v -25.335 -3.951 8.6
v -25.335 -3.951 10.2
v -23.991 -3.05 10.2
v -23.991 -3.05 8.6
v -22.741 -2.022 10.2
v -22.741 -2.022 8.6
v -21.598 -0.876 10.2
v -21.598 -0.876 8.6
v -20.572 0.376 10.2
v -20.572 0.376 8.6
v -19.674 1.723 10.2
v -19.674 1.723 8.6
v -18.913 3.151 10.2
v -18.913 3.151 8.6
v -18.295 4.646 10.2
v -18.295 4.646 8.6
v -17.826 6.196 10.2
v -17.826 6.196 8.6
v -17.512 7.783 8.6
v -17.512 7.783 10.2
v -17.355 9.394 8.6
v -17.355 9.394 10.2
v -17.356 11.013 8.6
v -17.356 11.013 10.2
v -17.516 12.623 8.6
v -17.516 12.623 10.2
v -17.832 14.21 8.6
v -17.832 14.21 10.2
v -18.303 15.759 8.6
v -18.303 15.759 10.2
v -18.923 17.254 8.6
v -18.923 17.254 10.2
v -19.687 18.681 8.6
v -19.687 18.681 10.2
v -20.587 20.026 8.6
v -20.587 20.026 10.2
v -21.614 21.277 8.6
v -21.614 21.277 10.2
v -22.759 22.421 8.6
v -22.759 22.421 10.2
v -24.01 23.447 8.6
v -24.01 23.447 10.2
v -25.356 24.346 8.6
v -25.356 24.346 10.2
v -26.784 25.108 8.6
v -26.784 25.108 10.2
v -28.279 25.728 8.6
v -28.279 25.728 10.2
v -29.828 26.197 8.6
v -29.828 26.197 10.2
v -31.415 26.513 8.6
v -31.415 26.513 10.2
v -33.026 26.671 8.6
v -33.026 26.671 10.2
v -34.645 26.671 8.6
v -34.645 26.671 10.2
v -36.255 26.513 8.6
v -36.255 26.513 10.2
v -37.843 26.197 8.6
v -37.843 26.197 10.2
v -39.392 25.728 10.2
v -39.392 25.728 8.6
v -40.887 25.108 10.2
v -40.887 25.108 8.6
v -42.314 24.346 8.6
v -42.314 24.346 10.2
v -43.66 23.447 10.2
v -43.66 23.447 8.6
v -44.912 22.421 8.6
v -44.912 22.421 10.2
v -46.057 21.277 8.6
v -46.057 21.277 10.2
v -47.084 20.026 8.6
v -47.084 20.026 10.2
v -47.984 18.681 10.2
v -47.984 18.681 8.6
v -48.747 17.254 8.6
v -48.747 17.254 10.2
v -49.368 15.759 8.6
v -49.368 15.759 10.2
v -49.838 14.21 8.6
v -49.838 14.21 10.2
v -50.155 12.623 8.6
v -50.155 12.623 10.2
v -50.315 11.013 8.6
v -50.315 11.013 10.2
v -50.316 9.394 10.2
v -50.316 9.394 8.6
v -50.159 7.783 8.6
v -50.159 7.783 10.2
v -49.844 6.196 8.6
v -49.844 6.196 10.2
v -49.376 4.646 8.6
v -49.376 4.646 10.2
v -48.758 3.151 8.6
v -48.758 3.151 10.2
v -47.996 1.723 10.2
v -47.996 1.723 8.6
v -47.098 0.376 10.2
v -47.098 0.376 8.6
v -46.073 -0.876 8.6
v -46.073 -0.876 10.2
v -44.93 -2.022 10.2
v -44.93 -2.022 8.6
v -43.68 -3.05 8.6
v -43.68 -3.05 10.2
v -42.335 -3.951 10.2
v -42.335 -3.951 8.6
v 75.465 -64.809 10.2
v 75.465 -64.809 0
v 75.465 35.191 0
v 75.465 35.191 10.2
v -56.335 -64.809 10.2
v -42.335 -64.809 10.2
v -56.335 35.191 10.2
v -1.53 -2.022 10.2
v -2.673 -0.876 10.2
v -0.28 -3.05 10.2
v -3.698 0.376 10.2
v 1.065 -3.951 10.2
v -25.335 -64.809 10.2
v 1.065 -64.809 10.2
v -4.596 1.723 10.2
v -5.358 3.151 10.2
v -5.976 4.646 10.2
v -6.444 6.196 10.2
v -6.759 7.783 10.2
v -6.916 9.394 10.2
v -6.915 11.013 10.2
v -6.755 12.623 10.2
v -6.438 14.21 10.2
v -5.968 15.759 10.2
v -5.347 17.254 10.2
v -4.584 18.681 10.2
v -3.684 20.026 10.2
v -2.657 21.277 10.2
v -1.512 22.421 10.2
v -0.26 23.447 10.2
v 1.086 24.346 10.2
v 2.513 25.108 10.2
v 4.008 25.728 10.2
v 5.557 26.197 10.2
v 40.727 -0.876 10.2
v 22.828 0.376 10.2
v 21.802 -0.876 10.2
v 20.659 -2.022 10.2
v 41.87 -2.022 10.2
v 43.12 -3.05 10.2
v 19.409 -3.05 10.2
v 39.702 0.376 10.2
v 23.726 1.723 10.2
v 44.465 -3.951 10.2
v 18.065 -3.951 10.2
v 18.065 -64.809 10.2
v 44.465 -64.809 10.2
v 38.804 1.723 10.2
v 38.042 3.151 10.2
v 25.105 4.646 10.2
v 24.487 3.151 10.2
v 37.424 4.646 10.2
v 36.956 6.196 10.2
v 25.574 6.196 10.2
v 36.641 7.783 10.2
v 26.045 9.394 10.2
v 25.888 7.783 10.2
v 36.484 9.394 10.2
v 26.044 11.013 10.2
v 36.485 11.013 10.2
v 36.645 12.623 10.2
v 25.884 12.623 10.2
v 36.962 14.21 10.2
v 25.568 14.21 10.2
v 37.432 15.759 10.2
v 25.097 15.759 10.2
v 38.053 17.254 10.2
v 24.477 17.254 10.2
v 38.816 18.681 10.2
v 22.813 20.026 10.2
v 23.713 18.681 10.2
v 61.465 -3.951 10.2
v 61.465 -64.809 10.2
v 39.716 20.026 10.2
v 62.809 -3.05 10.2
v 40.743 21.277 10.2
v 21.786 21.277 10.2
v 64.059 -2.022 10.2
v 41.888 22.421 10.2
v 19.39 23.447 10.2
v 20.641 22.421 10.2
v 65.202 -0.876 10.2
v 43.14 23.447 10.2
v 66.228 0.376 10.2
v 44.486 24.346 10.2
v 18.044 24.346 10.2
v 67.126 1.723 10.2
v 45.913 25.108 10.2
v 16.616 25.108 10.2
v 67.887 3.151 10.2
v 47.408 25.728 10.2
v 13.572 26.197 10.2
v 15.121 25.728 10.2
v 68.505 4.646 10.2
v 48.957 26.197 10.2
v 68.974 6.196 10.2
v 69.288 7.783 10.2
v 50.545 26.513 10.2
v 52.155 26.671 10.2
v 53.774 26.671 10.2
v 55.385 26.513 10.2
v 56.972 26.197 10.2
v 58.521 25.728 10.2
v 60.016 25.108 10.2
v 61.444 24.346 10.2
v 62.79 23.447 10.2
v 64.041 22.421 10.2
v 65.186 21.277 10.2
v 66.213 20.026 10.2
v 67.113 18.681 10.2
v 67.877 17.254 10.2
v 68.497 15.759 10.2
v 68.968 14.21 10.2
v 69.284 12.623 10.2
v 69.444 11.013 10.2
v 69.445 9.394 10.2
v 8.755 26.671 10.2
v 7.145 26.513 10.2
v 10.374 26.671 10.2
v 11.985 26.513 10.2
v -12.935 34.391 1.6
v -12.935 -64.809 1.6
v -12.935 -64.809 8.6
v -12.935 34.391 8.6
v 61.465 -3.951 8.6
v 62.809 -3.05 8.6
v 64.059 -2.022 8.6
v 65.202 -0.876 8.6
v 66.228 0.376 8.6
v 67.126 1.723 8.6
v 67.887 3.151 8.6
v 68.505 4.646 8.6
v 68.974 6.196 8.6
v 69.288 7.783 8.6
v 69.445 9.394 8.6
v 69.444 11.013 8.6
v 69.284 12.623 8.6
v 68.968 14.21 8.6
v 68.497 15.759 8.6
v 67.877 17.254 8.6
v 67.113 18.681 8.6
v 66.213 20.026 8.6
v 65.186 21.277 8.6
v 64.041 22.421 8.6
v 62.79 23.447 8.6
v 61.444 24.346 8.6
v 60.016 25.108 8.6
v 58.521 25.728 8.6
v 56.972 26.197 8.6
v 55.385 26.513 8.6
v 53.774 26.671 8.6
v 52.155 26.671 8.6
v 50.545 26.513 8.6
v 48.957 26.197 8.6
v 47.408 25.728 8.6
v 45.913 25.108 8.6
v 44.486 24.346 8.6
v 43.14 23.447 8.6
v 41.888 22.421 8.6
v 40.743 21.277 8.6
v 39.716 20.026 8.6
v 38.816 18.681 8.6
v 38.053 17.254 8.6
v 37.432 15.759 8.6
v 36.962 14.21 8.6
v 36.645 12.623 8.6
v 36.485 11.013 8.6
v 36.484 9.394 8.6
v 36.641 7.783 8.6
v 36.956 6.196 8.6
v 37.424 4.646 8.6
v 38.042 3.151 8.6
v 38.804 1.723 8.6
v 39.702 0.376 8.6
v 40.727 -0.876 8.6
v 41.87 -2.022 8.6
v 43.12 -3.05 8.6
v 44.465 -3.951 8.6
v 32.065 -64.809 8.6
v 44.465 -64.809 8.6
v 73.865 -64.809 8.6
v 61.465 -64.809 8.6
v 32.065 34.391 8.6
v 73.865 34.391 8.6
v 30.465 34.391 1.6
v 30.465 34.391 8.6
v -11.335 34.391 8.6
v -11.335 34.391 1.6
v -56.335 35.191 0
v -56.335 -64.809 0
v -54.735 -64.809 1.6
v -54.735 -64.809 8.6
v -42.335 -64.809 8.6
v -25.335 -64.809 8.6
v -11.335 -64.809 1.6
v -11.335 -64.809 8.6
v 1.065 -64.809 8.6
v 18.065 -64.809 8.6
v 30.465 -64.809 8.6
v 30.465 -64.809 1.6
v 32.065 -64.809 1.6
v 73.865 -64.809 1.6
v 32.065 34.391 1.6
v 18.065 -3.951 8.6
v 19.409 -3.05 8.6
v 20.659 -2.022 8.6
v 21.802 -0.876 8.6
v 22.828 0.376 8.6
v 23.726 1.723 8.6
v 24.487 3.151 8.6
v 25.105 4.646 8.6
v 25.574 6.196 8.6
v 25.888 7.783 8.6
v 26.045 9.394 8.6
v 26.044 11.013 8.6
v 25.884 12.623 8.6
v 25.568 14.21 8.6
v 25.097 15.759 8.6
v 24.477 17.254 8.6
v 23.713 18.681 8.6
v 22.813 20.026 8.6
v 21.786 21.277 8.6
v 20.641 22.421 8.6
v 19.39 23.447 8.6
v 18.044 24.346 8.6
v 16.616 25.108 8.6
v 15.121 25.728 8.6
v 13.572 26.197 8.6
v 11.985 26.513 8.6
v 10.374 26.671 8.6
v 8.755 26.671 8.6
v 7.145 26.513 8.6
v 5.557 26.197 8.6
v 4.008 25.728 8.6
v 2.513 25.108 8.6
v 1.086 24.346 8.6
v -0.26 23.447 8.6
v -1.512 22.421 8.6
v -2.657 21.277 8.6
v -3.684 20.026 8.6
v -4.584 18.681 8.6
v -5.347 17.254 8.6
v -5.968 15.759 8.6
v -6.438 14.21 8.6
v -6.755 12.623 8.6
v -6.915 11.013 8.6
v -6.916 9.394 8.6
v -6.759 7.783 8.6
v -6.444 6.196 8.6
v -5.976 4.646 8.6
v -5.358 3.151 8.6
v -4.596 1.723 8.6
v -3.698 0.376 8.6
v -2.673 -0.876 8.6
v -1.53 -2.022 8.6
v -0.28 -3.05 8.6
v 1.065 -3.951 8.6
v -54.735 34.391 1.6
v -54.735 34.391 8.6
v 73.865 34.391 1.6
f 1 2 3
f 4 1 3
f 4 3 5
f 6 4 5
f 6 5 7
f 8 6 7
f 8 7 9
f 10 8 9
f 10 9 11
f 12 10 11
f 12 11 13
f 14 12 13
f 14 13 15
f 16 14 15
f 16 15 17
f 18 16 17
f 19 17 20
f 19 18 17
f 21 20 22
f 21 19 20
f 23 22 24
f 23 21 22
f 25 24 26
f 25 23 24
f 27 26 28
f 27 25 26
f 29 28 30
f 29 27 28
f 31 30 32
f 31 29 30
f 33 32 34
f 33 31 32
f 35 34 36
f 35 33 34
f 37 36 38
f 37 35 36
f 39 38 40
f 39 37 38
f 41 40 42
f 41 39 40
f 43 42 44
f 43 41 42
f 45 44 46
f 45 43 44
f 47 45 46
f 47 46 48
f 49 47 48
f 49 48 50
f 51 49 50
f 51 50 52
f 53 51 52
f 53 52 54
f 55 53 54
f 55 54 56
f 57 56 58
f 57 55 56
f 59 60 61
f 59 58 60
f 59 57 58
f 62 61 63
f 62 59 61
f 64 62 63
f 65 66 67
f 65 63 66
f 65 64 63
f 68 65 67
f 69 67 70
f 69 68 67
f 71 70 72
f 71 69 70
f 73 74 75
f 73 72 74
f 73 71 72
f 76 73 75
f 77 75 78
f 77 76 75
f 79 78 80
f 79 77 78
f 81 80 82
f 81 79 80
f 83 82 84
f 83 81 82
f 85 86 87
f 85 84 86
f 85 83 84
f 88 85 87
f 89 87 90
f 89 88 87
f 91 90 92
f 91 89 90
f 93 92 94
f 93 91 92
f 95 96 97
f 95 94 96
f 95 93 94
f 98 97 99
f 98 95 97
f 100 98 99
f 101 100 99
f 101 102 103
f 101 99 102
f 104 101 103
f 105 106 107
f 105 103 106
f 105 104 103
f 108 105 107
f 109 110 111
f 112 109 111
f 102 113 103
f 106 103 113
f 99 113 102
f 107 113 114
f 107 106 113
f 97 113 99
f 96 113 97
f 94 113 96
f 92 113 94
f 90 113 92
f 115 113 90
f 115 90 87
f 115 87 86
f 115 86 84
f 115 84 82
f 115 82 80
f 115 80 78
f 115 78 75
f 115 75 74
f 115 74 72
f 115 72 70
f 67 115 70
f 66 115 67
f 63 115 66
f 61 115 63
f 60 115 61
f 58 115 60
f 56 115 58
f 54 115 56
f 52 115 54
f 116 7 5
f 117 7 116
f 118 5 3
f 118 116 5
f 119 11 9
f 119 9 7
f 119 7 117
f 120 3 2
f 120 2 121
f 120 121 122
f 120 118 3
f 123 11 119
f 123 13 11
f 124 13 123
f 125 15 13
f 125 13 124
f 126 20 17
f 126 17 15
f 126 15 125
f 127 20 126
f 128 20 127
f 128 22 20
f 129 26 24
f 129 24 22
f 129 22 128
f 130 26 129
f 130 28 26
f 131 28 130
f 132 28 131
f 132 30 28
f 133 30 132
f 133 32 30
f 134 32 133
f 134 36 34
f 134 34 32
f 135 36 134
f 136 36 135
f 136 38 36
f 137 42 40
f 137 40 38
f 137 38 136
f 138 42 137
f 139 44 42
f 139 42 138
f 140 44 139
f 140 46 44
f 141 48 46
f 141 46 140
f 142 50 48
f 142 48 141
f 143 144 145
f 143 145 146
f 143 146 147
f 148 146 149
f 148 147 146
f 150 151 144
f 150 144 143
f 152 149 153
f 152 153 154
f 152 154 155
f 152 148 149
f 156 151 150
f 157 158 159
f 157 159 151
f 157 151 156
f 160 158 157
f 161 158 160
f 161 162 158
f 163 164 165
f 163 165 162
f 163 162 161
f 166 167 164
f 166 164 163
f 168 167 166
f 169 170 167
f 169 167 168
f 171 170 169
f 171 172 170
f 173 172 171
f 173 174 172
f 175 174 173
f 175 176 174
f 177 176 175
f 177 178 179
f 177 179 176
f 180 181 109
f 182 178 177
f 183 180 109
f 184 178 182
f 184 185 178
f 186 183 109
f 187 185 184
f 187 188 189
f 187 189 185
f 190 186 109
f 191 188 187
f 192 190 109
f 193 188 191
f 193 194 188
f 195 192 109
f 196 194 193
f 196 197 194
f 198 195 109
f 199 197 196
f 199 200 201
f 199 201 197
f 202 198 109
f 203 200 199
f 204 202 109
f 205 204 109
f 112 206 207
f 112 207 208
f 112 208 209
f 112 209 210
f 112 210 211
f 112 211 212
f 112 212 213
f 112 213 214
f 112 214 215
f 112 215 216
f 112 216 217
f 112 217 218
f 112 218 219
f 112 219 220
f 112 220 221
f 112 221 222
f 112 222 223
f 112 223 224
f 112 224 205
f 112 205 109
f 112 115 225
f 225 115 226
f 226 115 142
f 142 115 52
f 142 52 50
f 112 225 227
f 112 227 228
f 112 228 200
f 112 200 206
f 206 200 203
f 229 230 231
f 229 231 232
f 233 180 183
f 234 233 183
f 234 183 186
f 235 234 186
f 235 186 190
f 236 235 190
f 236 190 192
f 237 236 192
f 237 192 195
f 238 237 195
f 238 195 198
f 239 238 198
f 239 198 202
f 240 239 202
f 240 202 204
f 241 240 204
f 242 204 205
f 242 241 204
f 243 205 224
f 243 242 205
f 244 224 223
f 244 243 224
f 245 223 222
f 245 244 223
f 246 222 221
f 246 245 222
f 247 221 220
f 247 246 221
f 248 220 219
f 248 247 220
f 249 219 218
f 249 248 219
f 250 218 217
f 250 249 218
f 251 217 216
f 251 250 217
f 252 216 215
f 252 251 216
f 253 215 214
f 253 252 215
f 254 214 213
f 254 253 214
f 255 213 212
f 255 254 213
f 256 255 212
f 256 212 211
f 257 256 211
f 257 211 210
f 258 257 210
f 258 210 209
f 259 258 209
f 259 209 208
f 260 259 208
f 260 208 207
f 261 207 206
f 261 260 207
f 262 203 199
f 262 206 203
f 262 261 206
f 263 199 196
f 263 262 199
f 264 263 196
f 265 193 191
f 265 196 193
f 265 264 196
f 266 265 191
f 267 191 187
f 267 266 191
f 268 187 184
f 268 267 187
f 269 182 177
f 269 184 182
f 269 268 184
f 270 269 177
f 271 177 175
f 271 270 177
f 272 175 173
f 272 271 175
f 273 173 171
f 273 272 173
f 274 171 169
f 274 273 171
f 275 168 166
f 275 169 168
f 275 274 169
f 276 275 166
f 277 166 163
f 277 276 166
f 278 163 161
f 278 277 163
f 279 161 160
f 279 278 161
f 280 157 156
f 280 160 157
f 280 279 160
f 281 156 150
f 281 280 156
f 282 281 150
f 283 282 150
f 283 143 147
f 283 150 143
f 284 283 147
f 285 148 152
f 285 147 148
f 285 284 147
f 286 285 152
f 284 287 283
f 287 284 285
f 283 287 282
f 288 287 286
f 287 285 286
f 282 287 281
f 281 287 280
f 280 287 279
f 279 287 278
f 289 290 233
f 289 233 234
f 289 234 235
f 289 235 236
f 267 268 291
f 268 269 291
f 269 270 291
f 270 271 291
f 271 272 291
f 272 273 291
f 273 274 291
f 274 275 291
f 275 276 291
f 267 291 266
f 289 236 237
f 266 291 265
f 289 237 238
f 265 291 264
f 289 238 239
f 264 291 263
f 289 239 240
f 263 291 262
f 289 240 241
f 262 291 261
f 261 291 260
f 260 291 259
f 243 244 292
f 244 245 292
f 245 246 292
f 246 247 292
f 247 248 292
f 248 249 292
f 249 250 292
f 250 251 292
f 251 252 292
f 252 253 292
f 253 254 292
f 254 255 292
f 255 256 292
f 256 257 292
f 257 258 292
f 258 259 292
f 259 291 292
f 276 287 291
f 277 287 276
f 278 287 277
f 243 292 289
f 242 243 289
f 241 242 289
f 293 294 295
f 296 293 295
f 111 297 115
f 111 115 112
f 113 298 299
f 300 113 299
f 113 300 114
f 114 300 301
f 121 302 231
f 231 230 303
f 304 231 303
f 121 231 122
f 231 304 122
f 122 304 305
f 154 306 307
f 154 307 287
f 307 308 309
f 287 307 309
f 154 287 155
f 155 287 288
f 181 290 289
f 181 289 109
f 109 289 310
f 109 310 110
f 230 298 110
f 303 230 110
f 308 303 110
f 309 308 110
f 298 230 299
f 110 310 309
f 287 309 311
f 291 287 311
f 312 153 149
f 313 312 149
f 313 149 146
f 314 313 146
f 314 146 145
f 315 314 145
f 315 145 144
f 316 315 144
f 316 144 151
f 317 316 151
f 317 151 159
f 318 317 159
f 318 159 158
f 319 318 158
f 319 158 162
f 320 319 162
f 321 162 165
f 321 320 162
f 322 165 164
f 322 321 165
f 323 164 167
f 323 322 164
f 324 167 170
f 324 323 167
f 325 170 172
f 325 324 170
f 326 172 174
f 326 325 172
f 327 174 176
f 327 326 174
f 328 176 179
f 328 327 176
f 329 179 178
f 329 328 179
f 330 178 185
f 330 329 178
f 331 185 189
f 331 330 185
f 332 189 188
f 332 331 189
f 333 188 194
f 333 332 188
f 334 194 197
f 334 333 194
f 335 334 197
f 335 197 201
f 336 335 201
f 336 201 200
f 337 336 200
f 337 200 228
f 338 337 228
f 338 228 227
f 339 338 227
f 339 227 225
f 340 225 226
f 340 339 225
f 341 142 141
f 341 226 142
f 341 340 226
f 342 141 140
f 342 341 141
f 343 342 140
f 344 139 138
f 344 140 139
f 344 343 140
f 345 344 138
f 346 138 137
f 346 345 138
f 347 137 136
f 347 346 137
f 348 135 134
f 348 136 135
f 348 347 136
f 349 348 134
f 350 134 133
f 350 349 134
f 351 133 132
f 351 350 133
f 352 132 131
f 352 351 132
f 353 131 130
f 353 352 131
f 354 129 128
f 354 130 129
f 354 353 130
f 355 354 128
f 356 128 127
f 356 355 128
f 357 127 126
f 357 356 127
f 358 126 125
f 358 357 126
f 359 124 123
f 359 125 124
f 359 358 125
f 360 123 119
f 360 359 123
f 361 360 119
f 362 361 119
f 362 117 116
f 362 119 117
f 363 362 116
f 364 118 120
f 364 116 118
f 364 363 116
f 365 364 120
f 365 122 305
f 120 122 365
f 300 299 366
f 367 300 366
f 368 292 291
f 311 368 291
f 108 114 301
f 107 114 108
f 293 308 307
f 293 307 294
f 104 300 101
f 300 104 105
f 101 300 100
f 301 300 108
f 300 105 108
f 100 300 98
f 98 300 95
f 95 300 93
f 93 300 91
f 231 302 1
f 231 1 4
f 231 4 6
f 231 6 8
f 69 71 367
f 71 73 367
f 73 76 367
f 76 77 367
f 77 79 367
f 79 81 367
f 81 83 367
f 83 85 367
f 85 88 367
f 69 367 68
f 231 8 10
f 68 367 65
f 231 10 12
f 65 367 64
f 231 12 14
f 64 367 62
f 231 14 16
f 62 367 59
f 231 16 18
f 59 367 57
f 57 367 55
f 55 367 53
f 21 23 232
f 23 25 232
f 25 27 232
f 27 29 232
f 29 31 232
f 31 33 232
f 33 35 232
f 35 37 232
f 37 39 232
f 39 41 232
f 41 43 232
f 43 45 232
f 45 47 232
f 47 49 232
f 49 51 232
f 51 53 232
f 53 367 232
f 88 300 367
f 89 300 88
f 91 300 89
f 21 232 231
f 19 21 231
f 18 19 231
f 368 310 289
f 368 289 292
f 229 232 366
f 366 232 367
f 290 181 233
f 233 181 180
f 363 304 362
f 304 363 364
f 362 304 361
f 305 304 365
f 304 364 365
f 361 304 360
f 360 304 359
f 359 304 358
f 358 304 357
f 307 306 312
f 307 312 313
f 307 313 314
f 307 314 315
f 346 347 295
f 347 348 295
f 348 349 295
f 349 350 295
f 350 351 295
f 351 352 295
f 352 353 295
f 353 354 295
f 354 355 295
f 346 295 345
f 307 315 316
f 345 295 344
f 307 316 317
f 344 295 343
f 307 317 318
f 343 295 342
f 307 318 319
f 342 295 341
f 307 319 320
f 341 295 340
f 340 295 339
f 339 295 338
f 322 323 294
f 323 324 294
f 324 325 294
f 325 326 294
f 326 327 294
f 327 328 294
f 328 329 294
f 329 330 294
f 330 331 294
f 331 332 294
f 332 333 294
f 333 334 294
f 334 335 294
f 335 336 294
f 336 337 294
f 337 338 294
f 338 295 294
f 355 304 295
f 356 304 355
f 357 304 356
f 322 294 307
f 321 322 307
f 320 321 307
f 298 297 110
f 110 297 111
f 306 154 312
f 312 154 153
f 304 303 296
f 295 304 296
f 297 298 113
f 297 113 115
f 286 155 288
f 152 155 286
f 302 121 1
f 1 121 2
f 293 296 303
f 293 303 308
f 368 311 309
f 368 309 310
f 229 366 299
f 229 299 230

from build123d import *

# Parameters (mm, degrees)
F0_W      = 45
F0_H      = 100
F1_DEPTH  = 10.2
F2_W      = 17
F2_H      = 70
F3_DEPTH  = 8.6
F4_W      = 41.8
F4_H      = 100
F5_DEPTH  = 7
F8_R      = 16.5
F9_DEPTH  = 10
F14_W     = 131.8
F14_H     = 10.2
F15_DEPTH = 0.8


with BuildPart() as f1:
    # F0 (on Top) → F1 (new body)
    with BuildSketch(Plane.XY):
        with Locations((-33.8353561237, -14.8088461805)):
            Rectangle(F0_W, F0_H)
    extrude(amount=F1_DEPTH)

    # F2 (on face) → F3 (cut)
    with BuildSketch(Plane.XY.offset(10.2)):
        with Locations((-33.8353561237, -29.8088461805)):
            Rectangle(F2_W, F2_H)
    extrude(amount=-F3_DEPTH, mode=Mode.SUBTRACT)


with BuildPart() as f5:
    # F4 (on Top) → F5 (new body)
    with BuildSketch(Plane.XY):
        with Locations((-35.4353561237, -14.8088461805)):
            Rectangle(F4_W, F4_H)
    extrude(amount=F5_DEPTH)


with BuildPart() as f5_1:
    # F6: moved
    add(f5.part.moved(Location((1.6, 0, 1.6))))


with BuildPart() as f1_1:
    add(f1.part)

    # F7: cut F5
    add(f5_1.part, mode=Mode.SUBTRACT)


with BuildPart() as f9:
    # F8 (on Top) → F9 (new body)
    with BuildSketch(Plane.XY):
        with Locations((-33.8353561237, -64.8088461805)):
            Circle(F8_R)
    extrude(amount=F9_DEPTH)


with BuildPart() as f9_1:
    # F10: moved
    add(f9.part.moved(Location((0, 75, 4))))


with BuildPart() as f1_2:
    add(f1_1.part)

    # F11: cut F9
    add(f9_1.part, mode=Mode.SUBTRACT)


with BuildPart() as f12_1:
    # F12: copy of F1
    add(f1_2.part.moved(Location((43.4, 0, 0))))


with BuildPart() as f13_1:
    # F13: copy of F12_1
    add(f12_1.part.moved(Location((43.4, 0, 0))))


with BuildPart() as f1_3:
    add(f1_2.part)

    add(f12_1.part)  # F15 merges F12_1

    add(f13_1.part)  # F15 merges F13_1
    # F14 (on face) → F15 (join)
    with BuildSketch(Plane(origin=(0, 35.1911538195, 0), x_dir=(-1, 0, 0), z_dir=(0, 1, 0))):
        with Locations((-9.5646438763, 5.1)):
            Rectangle(F14_W, F14_H)
    extrude(amount=-F15_DEPTH)


solid = f1_3.part
